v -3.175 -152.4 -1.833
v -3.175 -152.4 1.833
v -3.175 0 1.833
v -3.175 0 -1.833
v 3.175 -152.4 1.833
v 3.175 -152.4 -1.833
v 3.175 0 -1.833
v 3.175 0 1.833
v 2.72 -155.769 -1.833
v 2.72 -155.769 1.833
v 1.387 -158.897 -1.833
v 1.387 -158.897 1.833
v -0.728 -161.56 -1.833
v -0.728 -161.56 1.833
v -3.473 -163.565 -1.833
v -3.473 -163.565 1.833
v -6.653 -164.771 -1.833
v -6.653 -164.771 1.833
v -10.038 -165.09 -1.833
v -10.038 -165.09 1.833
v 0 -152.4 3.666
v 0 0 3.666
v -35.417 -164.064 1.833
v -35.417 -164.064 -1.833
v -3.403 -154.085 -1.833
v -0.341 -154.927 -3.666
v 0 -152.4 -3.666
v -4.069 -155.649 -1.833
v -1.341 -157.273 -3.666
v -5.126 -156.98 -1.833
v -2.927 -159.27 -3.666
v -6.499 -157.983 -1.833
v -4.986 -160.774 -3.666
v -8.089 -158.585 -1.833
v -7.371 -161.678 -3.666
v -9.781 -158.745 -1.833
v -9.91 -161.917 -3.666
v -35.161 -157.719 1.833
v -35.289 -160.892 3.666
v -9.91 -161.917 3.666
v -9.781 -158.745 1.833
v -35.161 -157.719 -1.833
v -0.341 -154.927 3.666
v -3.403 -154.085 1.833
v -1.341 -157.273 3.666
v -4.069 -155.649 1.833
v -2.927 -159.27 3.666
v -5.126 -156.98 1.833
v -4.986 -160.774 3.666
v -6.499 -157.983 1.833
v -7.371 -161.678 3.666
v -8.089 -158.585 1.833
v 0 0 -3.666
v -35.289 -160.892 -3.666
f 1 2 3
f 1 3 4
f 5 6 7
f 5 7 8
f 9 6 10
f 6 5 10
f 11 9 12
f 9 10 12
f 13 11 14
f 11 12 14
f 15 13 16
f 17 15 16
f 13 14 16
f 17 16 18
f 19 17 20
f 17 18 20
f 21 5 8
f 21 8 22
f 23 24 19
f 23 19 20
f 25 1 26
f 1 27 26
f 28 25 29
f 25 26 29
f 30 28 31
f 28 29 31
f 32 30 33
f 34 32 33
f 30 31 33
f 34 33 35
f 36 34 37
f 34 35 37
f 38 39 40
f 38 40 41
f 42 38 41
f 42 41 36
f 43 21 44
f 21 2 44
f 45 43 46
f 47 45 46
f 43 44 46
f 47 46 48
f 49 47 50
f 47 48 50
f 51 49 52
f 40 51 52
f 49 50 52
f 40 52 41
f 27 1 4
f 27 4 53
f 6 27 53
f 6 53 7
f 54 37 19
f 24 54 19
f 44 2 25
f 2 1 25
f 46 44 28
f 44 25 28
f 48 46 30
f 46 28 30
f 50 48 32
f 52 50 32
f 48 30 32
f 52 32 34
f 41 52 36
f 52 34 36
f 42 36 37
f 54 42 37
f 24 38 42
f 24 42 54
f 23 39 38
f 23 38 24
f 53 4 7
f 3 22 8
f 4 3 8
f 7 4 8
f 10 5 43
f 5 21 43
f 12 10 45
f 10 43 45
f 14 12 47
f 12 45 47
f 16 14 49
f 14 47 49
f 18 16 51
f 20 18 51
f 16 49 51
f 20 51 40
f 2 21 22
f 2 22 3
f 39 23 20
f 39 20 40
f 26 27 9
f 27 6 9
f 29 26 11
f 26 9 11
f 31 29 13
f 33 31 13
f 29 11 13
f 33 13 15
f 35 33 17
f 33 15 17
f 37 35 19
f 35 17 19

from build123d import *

# Parameters (mm, degrees)
F1_DEPTH = 152.4
F3_ANGLE = 92.3138340894
F4_DEPTH = 25.4


with BuildPart() as f1:
    # F0 (on Front) → F1 (new body)
    with BuildSketch(Plane.XZ):
        Polygon((3.175, -1.8330871047), (3.175, 1.8330871047), (0, 3.6661742094), (-3.175, 1.8330871047), (-3.175, -1.8330871047), (0, -3.6661742094), align=None)
    extrude(amount=F1_DEPTH)

    # F2 (on face) → F3 (revolve)
    with BuildSketch(Plane.XZ.offset(152.4)):
        Polygon((-3.175, 1.8330871047), (-3.175, -1.8330871047), (0, -3.6661742094), (3.175, -1.8330871047), (3.175, 1.8330871047), (0, 3.6661742094), align=None)
    revolve(axis=Axis((-9.525, -152.4, 0.9165435523), (0, 0, -1)), revolution_arc=F3_ANGLE)

    # F4 (add): a face of the model
    f4_faces = [f1.faces().sort_by_distance(p)[0] for p in [
        (-9.9095532751, -161.9172340403, 0),
    ]]
    extrude(f4_faces, amount=F4_DEPTH)


solid = f1.part
